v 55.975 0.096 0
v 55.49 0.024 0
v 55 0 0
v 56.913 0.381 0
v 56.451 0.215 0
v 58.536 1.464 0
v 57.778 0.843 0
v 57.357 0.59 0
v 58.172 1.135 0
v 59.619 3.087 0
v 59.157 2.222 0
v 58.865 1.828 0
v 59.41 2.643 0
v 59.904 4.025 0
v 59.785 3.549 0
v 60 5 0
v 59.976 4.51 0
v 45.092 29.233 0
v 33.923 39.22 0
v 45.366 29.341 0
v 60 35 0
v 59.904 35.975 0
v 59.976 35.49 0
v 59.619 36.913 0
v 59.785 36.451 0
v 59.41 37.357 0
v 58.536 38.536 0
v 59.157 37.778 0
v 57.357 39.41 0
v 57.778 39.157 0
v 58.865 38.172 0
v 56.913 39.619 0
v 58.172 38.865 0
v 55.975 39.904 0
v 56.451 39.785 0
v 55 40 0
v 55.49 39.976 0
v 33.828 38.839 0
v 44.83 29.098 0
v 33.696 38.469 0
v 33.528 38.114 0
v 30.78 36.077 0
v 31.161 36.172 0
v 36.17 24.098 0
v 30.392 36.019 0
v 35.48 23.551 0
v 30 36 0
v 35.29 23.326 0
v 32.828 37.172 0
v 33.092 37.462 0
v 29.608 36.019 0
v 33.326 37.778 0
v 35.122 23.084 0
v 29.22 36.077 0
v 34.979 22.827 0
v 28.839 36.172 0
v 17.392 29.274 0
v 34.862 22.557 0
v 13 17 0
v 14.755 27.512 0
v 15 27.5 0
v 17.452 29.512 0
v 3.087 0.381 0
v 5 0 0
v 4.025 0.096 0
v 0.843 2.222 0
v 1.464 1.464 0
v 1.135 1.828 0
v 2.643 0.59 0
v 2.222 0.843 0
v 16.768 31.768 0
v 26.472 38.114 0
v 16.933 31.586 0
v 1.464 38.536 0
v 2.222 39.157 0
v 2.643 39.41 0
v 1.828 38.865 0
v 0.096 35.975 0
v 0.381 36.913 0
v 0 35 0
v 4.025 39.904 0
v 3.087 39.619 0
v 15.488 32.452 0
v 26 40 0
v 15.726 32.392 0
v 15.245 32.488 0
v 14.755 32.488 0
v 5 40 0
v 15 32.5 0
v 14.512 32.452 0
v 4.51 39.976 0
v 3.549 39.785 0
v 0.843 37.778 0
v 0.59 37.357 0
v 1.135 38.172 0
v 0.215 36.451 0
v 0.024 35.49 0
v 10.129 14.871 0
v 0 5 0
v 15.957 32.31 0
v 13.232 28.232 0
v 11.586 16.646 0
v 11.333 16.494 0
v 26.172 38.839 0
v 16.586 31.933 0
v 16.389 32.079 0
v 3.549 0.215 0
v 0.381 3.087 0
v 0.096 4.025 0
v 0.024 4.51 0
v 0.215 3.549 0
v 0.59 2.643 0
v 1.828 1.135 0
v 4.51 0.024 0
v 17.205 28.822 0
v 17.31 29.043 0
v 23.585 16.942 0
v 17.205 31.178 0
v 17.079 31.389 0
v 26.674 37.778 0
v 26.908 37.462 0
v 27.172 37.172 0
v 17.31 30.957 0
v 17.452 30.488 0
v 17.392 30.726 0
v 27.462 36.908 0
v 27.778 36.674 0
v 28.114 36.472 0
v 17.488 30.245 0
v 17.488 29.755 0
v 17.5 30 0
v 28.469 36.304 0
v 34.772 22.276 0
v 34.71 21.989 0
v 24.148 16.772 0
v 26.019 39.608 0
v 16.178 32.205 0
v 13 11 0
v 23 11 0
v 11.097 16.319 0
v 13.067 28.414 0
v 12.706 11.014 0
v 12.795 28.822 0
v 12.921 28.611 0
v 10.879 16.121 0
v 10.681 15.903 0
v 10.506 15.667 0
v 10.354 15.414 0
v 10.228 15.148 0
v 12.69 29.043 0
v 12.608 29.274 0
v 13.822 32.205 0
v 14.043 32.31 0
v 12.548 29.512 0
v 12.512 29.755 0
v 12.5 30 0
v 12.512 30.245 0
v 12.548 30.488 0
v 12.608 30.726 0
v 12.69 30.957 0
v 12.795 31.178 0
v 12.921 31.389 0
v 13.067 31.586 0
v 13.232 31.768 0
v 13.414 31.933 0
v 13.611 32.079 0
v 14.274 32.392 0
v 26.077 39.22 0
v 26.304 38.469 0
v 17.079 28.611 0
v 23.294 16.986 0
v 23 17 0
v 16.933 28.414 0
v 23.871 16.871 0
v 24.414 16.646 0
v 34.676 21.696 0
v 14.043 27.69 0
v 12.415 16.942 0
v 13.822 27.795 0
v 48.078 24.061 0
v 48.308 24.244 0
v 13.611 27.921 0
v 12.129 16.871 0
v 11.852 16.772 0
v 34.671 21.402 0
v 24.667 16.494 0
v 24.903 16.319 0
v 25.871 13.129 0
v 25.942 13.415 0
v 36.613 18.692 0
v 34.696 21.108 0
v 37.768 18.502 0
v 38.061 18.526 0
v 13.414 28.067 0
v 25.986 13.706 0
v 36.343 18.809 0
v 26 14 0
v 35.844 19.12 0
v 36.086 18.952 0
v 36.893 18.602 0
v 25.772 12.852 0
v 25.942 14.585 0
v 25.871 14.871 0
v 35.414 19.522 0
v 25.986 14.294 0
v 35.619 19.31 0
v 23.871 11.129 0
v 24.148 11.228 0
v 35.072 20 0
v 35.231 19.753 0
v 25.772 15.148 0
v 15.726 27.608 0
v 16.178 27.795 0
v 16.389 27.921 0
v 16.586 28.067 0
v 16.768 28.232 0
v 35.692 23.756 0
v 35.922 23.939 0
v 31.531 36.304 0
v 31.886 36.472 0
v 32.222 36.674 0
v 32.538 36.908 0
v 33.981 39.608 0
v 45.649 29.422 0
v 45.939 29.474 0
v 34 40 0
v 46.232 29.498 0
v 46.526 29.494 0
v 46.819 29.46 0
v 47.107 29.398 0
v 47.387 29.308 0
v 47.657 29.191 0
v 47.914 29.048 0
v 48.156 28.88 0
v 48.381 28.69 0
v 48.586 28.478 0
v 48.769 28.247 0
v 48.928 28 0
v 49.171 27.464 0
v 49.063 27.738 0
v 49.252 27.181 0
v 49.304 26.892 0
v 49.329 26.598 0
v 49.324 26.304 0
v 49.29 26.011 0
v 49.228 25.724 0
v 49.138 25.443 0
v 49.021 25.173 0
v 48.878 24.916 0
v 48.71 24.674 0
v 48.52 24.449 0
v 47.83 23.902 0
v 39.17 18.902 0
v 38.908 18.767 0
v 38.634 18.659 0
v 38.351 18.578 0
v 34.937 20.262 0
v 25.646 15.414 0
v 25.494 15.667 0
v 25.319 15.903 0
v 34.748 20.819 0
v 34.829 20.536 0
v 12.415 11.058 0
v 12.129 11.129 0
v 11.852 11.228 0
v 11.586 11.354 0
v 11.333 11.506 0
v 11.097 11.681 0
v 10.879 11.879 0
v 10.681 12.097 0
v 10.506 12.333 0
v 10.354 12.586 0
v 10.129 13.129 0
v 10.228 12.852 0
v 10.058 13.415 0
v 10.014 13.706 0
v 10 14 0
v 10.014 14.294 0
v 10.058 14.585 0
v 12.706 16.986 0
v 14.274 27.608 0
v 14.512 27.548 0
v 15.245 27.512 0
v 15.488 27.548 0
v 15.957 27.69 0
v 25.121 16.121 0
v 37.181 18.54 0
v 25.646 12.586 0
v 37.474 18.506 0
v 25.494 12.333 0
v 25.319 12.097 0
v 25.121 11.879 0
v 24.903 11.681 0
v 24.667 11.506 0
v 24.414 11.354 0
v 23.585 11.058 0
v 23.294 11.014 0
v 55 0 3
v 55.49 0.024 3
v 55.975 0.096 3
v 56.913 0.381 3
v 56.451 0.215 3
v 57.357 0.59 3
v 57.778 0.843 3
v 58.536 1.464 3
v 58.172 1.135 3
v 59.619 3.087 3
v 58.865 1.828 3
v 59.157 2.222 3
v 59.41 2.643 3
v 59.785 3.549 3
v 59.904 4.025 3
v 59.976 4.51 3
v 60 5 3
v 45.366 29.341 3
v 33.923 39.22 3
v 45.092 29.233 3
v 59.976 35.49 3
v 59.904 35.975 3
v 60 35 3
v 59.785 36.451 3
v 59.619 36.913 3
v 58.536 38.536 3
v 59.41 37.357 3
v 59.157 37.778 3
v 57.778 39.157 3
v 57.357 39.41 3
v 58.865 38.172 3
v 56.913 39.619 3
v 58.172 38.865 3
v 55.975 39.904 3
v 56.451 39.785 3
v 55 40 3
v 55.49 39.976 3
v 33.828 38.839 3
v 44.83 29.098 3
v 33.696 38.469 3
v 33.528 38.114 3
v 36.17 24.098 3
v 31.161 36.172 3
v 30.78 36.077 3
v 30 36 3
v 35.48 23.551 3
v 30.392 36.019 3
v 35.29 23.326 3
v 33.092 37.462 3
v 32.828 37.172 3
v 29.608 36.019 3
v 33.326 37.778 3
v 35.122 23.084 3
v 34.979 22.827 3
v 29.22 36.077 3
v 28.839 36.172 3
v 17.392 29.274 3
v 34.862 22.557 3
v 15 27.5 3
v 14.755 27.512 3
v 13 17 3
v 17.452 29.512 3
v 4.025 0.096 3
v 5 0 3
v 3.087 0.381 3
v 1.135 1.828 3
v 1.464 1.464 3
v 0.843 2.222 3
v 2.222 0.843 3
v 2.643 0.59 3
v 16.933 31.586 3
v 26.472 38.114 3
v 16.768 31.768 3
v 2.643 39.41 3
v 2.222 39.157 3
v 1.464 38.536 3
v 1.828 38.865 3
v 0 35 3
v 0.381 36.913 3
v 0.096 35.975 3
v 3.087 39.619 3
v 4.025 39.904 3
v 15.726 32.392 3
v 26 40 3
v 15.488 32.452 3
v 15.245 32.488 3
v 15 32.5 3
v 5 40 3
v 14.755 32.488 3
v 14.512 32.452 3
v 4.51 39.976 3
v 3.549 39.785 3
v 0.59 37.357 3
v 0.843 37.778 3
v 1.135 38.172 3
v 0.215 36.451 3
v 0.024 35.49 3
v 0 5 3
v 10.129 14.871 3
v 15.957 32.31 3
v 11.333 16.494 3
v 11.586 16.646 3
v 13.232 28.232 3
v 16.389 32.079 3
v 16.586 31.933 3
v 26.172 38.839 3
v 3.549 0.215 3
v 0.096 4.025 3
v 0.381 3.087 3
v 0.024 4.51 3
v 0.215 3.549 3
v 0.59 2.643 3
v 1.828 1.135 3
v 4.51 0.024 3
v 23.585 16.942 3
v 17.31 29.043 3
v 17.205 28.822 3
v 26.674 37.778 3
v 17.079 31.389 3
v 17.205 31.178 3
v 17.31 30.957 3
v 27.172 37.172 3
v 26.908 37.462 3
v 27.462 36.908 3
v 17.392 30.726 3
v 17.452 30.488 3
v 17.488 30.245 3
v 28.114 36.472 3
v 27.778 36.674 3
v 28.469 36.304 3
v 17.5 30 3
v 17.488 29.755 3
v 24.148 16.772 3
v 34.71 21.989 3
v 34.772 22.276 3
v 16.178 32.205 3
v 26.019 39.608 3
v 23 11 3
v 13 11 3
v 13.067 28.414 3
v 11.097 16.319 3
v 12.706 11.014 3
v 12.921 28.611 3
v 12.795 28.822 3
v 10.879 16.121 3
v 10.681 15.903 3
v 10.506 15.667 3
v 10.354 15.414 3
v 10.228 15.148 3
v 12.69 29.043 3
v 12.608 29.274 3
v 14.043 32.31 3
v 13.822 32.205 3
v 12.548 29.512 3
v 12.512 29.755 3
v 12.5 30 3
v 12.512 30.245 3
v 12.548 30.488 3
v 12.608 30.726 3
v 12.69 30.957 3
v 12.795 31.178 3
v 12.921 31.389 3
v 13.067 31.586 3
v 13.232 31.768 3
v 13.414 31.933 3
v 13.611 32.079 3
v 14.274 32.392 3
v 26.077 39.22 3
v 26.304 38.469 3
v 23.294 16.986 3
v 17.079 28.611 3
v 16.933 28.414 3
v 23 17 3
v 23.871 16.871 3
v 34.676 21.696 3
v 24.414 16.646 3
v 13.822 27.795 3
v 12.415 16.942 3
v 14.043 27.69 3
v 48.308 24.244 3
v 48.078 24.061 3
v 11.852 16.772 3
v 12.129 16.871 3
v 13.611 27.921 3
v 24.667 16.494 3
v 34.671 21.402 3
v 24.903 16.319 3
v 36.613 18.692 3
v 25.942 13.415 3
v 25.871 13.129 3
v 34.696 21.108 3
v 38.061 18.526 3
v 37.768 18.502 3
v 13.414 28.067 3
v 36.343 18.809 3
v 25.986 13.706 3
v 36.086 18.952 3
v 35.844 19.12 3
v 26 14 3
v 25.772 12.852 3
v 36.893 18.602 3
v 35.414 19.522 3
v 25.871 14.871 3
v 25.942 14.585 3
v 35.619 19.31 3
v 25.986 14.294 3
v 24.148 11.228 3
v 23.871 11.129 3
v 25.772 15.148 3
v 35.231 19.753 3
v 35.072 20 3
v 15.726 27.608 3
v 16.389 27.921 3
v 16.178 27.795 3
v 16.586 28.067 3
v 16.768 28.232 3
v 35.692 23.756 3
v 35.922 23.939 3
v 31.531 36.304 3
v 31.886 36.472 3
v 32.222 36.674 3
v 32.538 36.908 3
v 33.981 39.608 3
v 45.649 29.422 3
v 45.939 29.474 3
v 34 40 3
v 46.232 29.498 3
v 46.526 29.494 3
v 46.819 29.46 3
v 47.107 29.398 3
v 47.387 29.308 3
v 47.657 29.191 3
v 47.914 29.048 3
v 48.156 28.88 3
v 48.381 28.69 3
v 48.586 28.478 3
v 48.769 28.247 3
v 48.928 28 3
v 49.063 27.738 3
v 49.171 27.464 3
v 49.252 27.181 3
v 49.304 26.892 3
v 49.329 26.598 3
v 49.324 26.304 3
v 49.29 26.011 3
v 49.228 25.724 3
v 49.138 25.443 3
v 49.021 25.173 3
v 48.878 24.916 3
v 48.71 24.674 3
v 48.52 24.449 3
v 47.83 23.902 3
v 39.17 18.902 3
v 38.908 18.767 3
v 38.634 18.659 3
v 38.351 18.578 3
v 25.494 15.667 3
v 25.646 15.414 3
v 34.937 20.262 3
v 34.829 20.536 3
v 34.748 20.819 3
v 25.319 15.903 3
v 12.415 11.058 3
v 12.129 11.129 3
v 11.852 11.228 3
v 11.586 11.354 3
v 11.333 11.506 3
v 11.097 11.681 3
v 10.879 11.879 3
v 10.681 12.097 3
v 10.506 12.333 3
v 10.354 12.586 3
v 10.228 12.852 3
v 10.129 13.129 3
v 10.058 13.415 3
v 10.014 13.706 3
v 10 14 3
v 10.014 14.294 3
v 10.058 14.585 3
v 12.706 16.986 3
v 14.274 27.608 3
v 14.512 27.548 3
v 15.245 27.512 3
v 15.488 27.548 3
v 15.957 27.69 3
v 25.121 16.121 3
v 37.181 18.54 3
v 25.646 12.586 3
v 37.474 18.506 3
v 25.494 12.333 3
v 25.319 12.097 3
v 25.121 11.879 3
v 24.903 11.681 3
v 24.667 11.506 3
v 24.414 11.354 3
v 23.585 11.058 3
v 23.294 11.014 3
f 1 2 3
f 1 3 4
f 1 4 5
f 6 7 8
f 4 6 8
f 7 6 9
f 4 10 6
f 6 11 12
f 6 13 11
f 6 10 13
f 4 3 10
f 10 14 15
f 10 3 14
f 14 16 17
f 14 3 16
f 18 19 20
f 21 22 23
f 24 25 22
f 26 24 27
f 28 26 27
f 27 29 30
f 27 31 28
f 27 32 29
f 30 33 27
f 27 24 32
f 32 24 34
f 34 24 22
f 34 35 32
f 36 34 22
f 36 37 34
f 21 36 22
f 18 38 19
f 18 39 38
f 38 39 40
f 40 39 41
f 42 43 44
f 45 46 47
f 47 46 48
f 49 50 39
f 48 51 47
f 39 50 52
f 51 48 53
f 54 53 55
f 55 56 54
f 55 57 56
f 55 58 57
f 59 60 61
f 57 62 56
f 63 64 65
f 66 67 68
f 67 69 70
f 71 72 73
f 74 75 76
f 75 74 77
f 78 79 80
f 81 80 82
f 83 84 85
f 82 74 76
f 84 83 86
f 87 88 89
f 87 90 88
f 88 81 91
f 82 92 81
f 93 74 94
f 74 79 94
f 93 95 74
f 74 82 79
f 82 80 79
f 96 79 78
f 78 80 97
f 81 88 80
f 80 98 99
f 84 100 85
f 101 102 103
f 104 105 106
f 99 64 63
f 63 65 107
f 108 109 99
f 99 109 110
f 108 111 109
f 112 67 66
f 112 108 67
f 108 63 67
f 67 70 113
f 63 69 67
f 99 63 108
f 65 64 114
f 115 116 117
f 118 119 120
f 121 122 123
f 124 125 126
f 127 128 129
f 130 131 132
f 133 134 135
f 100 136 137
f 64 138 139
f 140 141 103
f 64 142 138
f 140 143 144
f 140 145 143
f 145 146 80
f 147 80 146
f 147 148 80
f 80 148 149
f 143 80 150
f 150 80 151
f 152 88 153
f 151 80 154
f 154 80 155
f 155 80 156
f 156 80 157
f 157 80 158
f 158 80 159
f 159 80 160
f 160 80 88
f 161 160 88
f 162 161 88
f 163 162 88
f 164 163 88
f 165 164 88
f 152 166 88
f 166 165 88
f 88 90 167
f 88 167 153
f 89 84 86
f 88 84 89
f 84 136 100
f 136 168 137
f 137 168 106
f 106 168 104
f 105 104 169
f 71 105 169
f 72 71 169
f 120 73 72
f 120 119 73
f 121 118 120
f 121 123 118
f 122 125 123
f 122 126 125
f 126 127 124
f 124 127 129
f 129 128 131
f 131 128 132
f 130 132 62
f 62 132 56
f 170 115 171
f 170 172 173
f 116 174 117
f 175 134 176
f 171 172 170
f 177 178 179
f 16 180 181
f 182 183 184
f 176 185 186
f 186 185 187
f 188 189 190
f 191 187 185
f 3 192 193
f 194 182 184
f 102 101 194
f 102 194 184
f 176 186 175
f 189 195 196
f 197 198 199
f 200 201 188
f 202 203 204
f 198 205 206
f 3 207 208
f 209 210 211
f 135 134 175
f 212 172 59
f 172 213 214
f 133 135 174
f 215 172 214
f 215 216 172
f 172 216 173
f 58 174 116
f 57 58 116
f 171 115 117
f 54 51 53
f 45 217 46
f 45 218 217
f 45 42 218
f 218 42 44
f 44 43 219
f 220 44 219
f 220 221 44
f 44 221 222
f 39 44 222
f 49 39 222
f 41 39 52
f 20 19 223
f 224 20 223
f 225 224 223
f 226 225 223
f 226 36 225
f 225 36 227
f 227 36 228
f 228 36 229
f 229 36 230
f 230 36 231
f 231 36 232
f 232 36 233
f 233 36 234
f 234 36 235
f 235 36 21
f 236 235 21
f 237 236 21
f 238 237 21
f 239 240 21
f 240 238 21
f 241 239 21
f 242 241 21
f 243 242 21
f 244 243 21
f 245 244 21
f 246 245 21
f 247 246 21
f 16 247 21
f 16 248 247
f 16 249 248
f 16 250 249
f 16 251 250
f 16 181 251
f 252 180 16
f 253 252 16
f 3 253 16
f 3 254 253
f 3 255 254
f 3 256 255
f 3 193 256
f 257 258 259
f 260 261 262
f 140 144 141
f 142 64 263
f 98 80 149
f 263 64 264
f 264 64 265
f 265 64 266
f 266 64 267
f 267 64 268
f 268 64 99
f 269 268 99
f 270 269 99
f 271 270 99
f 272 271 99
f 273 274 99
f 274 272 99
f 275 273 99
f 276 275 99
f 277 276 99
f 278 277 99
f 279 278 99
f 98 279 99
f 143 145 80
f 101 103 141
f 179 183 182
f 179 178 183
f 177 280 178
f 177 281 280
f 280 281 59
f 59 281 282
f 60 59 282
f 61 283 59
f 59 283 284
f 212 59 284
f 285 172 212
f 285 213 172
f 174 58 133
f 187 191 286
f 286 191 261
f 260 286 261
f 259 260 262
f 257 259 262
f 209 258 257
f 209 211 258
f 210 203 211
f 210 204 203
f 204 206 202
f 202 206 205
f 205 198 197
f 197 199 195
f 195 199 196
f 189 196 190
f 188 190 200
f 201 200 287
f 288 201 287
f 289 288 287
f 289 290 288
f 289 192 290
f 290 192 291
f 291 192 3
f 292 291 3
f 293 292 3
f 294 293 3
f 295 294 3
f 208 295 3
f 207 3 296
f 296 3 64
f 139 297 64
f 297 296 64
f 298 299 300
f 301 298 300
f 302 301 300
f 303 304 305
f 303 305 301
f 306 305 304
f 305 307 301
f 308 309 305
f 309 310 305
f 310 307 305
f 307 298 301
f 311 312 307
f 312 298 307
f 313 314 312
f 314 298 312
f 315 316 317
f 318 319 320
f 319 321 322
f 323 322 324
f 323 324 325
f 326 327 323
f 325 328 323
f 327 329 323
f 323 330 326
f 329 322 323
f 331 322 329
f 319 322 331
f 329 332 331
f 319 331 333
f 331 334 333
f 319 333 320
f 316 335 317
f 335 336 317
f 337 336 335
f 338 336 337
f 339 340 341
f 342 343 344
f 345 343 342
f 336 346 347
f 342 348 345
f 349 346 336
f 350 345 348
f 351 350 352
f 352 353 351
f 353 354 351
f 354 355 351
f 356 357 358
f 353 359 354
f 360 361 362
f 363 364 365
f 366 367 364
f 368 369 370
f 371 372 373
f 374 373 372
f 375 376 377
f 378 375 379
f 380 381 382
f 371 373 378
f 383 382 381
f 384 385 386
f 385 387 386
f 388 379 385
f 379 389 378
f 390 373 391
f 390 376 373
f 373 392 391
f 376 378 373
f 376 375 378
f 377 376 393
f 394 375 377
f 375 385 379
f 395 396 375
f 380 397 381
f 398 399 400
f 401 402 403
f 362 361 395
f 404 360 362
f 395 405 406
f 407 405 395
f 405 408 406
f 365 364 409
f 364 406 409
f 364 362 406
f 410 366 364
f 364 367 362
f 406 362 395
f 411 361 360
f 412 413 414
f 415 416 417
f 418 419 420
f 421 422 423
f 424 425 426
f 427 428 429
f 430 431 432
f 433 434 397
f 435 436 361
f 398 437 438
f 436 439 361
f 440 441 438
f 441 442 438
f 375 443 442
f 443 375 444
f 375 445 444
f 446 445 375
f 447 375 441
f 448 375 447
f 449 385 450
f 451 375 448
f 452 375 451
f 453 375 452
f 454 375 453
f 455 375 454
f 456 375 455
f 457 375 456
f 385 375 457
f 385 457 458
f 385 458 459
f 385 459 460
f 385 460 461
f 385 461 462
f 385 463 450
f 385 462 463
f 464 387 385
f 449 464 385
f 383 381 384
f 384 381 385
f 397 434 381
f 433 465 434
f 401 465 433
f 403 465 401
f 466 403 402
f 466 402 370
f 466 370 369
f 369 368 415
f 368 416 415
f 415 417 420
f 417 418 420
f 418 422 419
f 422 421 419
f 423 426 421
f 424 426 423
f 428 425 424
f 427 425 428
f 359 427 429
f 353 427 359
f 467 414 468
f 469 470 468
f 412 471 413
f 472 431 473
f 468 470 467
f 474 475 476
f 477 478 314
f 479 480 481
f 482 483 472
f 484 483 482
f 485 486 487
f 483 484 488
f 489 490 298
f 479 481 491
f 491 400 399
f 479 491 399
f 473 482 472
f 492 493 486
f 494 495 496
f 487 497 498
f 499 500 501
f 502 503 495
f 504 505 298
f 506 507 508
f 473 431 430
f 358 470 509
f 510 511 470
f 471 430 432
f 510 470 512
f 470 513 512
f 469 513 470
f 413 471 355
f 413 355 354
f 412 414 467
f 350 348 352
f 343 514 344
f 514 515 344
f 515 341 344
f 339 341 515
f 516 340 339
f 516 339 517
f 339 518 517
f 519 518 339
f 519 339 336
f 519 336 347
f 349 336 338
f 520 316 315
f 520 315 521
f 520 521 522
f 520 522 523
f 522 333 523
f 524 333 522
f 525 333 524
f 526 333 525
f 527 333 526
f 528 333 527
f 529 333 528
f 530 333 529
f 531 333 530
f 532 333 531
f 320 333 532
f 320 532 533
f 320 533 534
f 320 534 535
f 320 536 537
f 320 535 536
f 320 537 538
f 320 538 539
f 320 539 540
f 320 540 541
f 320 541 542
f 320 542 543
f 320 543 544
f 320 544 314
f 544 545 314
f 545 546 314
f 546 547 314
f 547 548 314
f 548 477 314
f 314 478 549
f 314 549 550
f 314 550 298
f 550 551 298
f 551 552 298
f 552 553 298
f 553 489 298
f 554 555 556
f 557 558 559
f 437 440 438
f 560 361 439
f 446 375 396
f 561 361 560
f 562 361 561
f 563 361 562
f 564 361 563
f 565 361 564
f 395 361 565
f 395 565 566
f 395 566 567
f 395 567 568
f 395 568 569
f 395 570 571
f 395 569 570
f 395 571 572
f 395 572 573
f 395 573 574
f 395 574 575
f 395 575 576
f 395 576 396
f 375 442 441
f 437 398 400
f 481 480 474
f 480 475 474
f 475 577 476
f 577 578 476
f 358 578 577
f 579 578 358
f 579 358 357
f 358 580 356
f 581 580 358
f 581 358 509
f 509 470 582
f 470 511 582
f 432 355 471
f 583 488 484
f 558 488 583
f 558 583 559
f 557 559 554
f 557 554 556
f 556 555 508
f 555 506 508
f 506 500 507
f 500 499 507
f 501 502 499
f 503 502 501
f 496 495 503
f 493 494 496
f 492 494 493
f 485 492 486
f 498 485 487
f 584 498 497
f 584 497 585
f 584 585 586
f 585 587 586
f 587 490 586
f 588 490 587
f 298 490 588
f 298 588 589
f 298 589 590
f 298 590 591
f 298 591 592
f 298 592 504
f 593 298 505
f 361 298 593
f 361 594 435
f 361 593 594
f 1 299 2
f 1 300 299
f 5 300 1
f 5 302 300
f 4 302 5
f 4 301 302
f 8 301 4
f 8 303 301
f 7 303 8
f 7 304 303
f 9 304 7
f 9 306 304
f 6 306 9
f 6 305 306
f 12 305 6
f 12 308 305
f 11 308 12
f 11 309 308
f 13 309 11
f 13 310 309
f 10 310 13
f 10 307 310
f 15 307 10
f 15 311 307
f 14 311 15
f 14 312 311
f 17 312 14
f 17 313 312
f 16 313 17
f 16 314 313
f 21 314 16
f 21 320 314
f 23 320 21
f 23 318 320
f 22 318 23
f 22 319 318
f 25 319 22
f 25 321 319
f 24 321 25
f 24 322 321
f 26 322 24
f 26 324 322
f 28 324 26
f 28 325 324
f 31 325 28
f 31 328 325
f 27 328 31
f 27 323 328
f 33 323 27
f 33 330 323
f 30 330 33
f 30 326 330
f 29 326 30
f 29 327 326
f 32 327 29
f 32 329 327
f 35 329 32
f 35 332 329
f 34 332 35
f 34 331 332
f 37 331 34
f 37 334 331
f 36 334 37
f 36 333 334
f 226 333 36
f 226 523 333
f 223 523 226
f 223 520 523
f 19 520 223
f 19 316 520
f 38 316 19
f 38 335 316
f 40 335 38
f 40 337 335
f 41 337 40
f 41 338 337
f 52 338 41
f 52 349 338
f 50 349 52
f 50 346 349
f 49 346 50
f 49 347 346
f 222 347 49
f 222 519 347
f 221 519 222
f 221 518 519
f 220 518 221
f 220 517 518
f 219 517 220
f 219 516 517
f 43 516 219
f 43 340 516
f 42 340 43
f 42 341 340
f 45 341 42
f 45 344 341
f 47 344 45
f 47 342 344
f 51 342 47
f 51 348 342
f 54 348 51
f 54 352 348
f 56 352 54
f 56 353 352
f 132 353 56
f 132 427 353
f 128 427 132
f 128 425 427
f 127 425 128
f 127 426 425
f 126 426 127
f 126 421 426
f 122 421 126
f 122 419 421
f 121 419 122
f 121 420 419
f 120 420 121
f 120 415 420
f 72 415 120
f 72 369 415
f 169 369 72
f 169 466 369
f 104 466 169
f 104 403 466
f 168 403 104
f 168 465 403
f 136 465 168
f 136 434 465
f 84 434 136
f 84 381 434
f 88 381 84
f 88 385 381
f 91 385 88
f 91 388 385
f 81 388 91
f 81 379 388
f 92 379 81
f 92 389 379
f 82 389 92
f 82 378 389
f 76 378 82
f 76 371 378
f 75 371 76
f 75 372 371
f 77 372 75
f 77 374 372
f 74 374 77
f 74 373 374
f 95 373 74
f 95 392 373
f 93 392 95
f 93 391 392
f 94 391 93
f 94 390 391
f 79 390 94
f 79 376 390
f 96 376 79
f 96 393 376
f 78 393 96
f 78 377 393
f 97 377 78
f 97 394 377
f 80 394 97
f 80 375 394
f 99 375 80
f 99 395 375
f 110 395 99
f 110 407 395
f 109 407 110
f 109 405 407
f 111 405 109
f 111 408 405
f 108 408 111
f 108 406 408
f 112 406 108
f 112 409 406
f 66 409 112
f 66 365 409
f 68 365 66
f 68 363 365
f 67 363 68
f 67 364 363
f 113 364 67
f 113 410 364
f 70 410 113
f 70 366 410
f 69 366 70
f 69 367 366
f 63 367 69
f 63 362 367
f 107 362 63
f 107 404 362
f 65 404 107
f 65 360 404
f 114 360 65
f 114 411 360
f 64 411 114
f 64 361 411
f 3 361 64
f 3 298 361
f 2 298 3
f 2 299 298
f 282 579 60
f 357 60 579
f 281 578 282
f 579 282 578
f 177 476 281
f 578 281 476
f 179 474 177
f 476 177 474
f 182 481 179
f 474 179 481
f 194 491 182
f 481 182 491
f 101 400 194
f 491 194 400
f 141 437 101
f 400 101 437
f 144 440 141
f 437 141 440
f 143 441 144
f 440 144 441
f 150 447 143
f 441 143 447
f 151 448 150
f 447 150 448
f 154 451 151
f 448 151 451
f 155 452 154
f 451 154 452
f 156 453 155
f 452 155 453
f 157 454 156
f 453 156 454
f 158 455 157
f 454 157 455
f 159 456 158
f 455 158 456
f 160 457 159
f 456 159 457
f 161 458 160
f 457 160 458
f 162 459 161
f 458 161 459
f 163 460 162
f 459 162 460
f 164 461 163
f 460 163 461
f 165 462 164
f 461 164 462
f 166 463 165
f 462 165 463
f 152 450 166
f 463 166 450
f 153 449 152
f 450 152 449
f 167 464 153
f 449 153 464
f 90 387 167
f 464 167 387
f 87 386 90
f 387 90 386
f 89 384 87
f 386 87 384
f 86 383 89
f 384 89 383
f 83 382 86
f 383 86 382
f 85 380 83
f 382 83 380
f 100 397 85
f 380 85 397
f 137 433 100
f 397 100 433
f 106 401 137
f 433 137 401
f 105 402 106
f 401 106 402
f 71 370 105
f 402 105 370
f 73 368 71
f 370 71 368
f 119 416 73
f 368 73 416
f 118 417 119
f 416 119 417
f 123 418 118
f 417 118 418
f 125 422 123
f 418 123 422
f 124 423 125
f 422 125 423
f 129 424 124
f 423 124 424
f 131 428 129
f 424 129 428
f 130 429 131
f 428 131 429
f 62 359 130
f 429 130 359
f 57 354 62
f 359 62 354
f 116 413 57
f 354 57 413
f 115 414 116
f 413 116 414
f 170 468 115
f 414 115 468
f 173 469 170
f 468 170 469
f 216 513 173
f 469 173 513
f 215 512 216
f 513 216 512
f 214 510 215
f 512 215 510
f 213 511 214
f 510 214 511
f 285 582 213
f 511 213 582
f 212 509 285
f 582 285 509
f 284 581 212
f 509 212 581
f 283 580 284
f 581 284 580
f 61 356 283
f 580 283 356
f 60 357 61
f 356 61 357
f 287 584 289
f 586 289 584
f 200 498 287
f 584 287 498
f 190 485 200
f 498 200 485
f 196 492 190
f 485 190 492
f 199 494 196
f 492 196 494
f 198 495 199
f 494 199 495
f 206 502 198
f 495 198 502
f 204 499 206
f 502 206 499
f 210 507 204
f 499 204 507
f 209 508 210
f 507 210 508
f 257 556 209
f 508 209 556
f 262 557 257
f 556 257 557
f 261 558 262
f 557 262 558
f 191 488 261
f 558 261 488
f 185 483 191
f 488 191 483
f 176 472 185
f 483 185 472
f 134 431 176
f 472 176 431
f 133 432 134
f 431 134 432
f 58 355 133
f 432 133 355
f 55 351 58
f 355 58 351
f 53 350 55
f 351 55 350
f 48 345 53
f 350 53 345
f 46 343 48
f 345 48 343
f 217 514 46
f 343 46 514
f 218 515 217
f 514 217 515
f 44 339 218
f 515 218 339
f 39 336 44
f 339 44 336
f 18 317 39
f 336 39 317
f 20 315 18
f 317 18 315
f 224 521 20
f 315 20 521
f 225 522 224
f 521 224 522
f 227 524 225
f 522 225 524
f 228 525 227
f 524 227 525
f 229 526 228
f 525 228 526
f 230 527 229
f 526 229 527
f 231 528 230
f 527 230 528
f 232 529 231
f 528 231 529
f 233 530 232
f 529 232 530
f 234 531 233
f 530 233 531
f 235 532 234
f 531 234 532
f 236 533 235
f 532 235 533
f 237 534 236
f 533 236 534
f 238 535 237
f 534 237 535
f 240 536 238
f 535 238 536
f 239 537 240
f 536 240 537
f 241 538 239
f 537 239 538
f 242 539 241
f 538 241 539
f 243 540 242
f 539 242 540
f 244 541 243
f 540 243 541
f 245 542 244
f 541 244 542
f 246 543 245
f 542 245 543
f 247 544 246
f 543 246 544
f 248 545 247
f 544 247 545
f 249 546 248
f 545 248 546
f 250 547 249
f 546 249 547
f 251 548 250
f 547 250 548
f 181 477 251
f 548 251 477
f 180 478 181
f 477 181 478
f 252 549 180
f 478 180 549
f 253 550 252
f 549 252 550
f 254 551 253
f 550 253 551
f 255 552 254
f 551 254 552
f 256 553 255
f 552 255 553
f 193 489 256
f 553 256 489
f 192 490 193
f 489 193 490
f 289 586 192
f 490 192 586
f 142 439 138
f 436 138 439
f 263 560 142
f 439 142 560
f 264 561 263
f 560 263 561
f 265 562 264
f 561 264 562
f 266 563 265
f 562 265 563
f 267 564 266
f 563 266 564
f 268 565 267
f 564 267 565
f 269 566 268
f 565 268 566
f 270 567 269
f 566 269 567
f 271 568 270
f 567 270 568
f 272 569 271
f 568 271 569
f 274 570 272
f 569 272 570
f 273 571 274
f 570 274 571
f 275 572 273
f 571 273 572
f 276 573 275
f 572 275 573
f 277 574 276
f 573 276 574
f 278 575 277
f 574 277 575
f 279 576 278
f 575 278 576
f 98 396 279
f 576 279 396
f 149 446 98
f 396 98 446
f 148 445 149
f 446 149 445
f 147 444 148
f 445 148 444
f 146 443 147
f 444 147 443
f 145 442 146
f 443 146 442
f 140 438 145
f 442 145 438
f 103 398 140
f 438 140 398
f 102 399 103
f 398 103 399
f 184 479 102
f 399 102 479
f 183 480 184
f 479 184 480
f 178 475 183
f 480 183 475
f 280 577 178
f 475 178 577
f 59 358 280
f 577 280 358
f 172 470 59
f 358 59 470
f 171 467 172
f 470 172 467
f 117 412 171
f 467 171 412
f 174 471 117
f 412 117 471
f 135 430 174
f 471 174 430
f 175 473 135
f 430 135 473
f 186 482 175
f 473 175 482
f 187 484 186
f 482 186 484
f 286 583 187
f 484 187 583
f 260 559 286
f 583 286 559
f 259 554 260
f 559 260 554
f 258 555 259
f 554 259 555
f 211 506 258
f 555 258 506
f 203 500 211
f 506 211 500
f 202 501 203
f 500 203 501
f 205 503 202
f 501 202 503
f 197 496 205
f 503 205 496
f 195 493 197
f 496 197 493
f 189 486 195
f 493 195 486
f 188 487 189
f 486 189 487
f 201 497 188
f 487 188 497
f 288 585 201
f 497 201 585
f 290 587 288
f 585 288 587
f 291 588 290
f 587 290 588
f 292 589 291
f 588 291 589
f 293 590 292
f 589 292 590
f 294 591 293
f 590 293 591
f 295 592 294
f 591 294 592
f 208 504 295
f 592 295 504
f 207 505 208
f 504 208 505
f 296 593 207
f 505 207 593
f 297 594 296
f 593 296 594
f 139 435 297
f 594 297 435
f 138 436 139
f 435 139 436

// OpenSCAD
// file: rounded_plate.scad
// Independent, hand-written ground truth: rounds belong to the 2D outline.
// Overall slot length includes the two semicircular ends.
$fn = 64;

module rounded_plate() {
    linear_extrude(height=3) difference() {
        hull() for (x=[5,55], y=[5,35]) translate([x,y]) circle(r=5);
        translate([30,40]) circle(r=4); // concave semicircular outline notch
        translate([18,14]) hull() for (x=[-5,5]) translate([x,0]) circle(r=3);
        translate([42,24]) rotate(30)
            hull() for (x=[-5,5]) translate([x,0]) circle(r=3);
        translate([15,30]) circle(d=5);
    }
}

rounded_plate();
// main file
// OpenSCAD defaults: $fn=0, $fa=12, $fs=2. No resolution overrides.
use <rounded_plate.scad>
rounded_plate();
